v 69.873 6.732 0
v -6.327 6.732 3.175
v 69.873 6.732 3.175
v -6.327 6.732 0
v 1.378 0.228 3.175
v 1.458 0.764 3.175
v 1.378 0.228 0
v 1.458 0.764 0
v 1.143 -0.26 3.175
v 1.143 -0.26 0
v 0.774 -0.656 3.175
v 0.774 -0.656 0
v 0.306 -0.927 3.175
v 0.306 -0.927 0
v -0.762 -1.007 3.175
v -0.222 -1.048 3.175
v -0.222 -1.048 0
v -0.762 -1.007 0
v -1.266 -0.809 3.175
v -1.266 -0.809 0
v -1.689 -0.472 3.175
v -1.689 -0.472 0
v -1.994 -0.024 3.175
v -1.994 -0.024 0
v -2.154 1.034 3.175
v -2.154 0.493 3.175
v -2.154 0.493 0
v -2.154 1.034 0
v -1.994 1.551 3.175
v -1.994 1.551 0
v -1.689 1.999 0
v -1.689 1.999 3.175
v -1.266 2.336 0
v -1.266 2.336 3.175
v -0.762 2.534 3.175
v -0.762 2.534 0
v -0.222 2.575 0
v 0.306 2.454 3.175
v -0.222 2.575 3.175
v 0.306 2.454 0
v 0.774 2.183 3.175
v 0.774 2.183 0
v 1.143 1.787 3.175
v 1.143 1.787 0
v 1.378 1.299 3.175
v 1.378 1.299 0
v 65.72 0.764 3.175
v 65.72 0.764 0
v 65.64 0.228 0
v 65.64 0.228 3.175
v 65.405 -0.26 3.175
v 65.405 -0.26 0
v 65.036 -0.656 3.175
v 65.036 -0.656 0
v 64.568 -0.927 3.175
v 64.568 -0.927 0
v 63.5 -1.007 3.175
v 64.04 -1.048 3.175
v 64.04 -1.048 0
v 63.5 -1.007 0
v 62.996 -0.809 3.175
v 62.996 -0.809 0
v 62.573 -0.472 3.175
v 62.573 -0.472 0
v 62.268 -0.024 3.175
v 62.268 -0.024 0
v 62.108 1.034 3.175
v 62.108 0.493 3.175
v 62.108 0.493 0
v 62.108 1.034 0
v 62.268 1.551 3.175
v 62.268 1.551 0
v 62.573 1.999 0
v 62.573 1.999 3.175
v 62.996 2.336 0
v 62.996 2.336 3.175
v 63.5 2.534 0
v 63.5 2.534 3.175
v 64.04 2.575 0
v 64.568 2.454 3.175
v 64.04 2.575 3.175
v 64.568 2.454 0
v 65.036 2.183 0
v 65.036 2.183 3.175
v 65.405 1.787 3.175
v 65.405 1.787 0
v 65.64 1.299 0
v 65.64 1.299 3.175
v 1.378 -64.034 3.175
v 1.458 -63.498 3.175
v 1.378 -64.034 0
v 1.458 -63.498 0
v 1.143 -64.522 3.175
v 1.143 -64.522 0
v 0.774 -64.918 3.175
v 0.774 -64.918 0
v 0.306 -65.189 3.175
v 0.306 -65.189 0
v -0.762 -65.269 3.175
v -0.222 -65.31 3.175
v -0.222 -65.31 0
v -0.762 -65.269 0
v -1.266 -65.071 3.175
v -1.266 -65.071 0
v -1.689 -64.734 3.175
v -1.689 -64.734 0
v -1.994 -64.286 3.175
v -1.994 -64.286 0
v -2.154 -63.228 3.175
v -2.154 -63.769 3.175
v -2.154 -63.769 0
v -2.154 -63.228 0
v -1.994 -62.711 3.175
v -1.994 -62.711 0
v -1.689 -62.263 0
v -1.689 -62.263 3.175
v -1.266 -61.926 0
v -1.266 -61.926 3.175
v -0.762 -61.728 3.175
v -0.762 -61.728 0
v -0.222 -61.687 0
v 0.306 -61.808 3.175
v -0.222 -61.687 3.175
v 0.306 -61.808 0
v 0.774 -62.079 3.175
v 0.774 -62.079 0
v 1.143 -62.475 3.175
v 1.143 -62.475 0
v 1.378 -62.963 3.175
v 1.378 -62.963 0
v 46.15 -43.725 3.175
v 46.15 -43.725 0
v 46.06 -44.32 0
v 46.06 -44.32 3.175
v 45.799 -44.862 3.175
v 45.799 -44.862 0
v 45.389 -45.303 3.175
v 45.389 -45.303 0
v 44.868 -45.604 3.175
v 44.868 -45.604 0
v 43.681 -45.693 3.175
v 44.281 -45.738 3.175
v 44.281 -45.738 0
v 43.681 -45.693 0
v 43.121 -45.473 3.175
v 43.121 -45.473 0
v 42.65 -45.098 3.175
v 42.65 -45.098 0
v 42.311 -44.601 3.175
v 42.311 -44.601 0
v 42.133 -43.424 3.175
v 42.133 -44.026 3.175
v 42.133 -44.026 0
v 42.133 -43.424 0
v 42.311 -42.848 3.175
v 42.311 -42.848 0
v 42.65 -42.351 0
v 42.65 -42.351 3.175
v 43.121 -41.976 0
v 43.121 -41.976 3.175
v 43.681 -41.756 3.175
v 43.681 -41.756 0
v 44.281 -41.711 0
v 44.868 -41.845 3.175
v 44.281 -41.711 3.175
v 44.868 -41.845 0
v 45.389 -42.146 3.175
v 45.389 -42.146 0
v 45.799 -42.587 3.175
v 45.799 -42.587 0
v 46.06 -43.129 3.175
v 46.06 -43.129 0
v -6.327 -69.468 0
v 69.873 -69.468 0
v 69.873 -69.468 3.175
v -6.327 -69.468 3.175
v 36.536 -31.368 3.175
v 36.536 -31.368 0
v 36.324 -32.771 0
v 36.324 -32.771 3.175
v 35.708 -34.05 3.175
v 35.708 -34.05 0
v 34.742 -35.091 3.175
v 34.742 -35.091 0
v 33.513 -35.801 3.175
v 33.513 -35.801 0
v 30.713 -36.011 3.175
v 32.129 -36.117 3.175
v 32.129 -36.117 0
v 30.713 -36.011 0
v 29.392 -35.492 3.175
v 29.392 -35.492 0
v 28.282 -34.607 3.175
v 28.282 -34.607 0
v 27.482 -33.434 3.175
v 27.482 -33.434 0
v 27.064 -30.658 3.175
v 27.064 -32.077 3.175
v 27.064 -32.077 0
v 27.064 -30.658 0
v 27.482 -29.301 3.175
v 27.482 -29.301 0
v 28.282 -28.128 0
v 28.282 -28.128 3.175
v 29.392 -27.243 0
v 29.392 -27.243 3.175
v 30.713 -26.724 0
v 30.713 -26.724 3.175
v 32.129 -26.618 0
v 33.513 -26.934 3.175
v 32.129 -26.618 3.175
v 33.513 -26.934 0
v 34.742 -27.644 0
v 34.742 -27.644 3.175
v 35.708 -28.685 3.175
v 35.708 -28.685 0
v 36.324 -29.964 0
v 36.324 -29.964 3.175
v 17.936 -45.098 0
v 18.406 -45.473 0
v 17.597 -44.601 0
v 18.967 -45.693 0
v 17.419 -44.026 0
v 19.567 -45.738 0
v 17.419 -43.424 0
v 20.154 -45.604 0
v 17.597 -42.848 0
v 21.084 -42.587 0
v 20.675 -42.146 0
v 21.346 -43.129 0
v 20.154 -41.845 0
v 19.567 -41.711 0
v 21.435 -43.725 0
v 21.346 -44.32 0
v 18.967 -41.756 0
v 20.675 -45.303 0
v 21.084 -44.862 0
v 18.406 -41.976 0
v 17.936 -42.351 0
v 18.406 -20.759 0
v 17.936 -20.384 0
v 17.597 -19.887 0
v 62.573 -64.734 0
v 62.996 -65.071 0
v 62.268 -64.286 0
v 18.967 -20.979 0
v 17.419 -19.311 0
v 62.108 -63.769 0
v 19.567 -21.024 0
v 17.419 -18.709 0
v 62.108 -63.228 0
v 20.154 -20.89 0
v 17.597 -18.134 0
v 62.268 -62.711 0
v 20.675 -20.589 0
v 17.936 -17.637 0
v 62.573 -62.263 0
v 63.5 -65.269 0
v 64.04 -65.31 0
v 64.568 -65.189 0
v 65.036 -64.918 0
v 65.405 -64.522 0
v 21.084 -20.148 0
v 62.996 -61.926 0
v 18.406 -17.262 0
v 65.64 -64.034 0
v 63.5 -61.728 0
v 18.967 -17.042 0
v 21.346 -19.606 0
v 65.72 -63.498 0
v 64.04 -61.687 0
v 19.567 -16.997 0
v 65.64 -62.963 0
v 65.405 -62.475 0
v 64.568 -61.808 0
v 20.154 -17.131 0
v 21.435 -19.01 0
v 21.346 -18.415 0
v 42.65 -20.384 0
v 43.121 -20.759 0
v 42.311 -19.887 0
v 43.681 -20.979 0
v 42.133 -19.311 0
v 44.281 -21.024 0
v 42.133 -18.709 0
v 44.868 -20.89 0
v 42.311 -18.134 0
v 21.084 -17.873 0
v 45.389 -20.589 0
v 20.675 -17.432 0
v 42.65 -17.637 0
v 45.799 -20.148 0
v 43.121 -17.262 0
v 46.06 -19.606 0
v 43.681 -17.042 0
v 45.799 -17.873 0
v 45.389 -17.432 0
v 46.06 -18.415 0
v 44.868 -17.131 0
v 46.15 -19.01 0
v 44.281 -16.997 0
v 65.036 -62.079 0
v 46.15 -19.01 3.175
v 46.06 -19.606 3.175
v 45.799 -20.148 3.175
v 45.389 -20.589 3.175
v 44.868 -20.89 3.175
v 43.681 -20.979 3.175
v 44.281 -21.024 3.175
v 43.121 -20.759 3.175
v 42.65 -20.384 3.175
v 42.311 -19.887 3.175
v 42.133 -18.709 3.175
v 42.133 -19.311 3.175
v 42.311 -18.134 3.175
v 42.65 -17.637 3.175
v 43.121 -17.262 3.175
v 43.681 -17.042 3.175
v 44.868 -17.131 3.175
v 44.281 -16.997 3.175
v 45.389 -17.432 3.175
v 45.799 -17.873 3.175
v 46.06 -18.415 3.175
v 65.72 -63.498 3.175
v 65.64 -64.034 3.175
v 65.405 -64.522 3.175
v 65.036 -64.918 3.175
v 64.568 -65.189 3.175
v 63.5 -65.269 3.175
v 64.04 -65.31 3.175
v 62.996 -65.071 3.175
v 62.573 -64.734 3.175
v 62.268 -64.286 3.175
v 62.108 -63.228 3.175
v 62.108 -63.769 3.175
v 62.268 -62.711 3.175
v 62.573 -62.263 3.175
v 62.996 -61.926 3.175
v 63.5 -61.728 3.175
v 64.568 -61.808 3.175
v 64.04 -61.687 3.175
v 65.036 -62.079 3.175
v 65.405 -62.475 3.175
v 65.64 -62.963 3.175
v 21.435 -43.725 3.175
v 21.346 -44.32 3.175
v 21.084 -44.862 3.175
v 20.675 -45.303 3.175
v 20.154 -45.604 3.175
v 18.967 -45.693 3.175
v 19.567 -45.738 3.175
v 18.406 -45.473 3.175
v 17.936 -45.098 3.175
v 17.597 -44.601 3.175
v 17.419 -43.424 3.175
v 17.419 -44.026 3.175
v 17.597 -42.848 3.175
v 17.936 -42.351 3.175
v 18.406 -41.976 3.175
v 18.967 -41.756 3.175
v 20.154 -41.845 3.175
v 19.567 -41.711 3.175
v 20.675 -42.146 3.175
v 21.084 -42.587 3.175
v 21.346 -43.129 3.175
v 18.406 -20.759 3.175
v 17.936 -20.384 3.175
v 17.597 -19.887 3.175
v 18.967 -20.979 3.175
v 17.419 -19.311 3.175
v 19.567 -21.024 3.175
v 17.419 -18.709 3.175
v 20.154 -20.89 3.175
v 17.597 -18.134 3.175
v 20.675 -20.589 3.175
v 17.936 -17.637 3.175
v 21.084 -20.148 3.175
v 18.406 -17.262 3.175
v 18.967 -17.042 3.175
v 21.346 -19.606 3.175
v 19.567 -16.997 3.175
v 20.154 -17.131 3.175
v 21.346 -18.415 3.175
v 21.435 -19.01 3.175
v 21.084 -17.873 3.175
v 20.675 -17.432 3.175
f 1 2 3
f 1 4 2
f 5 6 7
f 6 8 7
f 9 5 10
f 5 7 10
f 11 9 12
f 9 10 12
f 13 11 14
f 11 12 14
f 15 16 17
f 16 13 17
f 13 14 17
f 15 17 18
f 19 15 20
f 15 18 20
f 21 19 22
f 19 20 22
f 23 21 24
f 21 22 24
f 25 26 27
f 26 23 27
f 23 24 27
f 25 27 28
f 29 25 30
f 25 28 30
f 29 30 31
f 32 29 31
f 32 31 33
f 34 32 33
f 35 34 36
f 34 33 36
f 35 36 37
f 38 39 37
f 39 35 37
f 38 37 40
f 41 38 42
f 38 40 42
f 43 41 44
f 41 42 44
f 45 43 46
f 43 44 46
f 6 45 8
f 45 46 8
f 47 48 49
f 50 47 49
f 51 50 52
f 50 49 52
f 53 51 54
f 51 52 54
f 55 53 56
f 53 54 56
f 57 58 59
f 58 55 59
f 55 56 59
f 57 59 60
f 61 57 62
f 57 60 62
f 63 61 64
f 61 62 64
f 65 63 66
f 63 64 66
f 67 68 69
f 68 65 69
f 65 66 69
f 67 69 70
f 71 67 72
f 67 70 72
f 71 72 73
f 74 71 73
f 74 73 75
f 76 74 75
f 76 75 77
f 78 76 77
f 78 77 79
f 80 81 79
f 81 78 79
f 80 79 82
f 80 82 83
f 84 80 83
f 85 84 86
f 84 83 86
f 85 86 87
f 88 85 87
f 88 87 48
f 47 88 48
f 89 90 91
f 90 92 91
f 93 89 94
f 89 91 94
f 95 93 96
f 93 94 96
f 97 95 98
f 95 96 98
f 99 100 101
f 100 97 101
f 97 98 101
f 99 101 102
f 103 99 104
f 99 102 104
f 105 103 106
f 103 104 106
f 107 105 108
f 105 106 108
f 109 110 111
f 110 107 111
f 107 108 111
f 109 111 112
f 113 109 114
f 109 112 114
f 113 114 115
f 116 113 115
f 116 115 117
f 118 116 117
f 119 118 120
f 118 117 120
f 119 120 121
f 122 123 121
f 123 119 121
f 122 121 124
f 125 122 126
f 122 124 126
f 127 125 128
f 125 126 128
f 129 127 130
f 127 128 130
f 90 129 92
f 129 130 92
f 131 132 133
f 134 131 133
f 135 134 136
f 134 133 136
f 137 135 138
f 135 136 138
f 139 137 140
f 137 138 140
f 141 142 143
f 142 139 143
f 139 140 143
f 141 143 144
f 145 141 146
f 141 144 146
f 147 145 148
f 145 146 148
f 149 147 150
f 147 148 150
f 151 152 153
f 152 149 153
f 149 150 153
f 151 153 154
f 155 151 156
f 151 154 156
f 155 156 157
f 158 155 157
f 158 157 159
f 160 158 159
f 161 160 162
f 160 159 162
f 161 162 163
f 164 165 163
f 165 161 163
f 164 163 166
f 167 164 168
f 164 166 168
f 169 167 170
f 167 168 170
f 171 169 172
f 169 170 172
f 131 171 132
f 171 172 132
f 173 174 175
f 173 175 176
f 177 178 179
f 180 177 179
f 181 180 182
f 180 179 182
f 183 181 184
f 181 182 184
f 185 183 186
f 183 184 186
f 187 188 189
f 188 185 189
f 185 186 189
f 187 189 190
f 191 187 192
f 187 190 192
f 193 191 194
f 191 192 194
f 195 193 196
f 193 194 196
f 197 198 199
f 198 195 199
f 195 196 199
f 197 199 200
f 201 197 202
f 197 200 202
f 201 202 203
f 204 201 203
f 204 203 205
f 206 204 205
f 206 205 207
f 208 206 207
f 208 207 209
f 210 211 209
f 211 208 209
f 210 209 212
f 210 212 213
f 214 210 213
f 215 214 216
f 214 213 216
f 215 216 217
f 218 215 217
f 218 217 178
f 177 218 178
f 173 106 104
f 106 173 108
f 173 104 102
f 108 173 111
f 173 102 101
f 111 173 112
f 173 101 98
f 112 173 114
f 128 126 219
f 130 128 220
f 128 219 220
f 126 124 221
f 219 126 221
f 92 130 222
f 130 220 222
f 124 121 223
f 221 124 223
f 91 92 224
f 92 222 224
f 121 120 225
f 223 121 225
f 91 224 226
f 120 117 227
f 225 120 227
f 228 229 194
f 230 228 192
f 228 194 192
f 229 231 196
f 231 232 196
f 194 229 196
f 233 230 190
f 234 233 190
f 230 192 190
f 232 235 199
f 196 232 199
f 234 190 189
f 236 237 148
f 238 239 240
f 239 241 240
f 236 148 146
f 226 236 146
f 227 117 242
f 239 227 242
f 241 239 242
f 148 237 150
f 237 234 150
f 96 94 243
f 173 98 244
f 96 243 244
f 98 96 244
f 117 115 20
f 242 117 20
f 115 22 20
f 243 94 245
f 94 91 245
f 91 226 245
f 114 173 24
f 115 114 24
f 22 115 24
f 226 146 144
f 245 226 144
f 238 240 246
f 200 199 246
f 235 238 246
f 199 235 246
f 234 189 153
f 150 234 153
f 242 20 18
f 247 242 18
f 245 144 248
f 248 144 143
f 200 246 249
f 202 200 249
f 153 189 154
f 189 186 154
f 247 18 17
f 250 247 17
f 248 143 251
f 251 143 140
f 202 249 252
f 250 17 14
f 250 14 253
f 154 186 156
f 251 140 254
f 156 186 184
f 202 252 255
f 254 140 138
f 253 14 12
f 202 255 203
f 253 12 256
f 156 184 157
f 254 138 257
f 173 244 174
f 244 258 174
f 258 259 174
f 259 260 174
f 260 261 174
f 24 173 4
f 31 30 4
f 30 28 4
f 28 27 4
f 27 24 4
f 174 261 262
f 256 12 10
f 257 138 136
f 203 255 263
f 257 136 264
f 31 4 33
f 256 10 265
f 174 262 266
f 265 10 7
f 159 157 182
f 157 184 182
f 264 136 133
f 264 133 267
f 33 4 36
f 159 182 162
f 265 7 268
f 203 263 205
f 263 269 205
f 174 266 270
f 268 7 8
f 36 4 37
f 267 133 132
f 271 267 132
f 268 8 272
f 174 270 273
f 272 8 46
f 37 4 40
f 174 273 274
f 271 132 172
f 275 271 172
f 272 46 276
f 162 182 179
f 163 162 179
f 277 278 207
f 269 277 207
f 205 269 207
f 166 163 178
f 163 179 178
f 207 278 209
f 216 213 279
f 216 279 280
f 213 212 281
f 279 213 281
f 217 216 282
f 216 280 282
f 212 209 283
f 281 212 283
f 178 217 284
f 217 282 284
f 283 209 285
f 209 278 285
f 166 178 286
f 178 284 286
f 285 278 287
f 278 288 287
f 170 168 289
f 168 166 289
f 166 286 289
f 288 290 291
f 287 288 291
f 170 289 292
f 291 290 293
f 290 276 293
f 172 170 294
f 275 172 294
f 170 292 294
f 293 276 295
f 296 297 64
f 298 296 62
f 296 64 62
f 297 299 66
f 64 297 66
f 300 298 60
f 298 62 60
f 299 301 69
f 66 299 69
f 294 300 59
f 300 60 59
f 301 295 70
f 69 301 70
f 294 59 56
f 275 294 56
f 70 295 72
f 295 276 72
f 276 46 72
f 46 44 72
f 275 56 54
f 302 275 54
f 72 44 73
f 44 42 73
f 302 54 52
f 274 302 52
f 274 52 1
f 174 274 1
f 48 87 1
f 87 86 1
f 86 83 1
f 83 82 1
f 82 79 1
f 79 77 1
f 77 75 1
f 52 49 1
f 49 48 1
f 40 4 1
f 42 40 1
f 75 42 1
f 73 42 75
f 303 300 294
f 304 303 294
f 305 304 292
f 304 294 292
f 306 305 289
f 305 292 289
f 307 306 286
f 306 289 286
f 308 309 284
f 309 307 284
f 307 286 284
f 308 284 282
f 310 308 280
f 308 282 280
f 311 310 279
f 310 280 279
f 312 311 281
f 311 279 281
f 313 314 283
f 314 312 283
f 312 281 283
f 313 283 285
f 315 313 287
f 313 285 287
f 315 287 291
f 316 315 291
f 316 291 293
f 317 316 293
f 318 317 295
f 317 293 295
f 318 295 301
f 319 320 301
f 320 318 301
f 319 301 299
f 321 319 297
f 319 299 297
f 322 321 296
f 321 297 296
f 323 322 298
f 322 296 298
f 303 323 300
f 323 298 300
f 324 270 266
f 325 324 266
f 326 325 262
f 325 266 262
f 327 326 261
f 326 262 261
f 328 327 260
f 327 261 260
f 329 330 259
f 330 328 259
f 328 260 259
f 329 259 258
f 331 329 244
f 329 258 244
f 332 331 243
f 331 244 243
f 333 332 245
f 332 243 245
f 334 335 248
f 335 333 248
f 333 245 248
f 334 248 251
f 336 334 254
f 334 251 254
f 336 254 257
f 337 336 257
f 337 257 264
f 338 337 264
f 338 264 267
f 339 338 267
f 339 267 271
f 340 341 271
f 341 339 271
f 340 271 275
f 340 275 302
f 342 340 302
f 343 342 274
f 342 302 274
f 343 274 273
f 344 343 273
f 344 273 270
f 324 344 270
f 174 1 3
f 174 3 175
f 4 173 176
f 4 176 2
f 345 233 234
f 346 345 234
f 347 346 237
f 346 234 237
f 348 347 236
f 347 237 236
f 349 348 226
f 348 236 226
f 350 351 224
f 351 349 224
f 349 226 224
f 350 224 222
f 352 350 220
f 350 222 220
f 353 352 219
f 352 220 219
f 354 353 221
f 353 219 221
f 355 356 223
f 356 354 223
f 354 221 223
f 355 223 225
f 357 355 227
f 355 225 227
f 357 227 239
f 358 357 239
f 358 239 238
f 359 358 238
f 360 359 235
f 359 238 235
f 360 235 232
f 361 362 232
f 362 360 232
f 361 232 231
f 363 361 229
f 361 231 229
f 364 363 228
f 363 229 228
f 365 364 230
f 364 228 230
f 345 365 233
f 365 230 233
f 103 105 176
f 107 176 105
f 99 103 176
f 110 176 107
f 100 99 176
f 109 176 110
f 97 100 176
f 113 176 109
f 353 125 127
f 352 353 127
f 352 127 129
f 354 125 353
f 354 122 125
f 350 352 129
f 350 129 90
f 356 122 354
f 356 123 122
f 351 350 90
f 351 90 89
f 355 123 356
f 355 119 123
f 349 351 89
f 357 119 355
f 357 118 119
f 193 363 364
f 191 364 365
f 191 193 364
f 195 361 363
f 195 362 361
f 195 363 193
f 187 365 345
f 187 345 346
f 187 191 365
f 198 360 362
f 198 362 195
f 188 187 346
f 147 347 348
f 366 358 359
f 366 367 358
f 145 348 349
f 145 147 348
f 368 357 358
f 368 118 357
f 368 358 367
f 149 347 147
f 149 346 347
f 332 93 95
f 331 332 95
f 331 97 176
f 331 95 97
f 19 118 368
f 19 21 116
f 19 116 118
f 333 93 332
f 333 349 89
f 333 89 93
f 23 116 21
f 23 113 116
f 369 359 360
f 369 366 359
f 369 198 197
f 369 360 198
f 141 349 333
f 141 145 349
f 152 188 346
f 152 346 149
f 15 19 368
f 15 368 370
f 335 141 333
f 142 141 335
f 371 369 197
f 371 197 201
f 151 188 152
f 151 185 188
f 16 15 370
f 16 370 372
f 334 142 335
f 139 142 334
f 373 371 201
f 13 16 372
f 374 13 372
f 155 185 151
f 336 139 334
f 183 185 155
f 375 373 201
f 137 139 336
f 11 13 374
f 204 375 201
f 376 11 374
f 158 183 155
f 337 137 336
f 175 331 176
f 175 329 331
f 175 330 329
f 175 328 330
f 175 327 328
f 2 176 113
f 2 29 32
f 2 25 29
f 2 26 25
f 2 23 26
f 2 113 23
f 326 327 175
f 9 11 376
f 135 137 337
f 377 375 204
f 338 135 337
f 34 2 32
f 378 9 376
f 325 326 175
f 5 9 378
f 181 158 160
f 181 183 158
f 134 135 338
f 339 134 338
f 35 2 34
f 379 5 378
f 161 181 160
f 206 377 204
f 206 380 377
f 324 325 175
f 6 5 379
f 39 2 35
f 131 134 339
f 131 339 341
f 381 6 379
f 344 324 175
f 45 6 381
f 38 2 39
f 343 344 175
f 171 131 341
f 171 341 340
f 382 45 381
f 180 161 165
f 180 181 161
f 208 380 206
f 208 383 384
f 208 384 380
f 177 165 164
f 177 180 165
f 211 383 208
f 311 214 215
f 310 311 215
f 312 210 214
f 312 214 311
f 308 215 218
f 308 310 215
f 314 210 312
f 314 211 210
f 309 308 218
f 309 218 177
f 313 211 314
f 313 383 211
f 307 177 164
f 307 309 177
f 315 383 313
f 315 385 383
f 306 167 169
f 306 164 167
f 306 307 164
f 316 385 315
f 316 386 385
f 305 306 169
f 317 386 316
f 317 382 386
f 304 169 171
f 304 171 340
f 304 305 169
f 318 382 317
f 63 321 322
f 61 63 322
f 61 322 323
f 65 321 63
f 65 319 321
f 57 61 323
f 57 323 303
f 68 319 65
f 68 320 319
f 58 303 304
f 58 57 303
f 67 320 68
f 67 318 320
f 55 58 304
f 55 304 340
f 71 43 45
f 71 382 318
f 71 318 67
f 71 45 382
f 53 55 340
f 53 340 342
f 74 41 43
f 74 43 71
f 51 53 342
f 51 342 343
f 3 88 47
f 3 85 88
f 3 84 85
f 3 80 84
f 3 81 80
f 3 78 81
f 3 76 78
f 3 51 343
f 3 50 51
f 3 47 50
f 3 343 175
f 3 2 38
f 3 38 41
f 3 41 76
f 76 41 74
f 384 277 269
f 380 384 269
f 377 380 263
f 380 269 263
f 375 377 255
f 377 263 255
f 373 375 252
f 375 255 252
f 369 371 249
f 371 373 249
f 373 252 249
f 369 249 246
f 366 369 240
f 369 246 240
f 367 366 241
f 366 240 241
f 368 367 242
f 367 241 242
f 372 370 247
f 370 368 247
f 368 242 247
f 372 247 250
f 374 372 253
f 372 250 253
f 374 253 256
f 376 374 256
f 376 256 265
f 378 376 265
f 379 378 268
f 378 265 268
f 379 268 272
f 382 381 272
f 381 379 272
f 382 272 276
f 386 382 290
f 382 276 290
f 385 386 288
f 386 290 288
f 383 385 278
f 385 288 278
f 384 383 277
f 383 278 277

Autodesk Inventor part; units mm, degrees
ref_plane "YZ Plane" through (0, 0, 0) normal (1, 0, 0) x (0, 1, 0)
ref_plane "XZ Plane" through (0, 0, 0) normal (0, 1, 0) x (-1, 0, 0)
ref_plane "XY Plane" through (0, 0, 0) normal (0, 0, 1) x (1, 0, 0)
sketch "Sketch1" plane through (0, 0, 0) normal (0, 0, 1) x (1, 0, 0)
  line L0 (-6.3269, 6.7325) -> (69.8731, 6.7325)
  line L1 (69.8731, 6.7325) -> (69.8731, -69.4675)
  line L2 (69.8731, -69.4675) -> (-6.3269, -69.4675)
  line L3 (-6.3269, -69.4675) -> (-6.3269, 6.7325)
  line L4 (-6.3269, 6.7325) -> (69.8731, -69.4675) construction
  line L5 (69.8731, 6.7325) -> (-6.3269, -69.4675) construction
  circle A0 centre (31.7731, -31.3675) radius 4.7625
  circle A1 centre (63.9041, 0.7635) radius 1.8161
  circle A2 centre (63.9041, -63.4985) radius 1.8161
  circle A3 centre (-0.3579, -63.4985) radius 1.8161
  circle A4 centre (-0.3579, 0.7635) radius 1.8161
  line L6 (12.7231, -50.4175) -> (50.8231, -50.4175) construction
  line L7 (50.8231, -50.4175) -> (50.8231, -12.3175) construction
  line L8 (50.8231, -12.3175) -> (12.7231, -12.3175) construction
  line L9 (12.7231, -12.3175) -> (12.7231, -50.4175) construction
  line L10 (12.7231, -50.4175) -> (50.8231, -12.3175) construction
  line L11 (50.8231, -50.4175) -> (12.7231, -12.3175) construction
  circle A5 centre (19.416, -19.0104) radius 2.0193
  circle A6 centre (44.1302, -19.0104) radius 2.0193
  circle A7 centre (19.416, -43.7246) radius 2.0193
  circle A8 centre (44.1302, -43.7246) radius 2.0193
  dimension "d0" = 76.2
  dimension "d1" = 76.2
  dimension "d2" = 9.525
  dimension "d4" = 3.6322
  dimension "d5" = 3.6322
  dimension "d6" = 3.6322
  dimension "d7" = 3.6322
  dimension "d11" = 38.1
  dimension "d12" = 38.1
  dimension "d13" = 4.0386
  dimension "d14" = 4.0386
  dimension "d15" = 4.0386
  dimension "d16" = 4.0386
  dimension "d17" = 24.7142
  dimension "d18" = 64.262
extrude "Extrusion1" add sketch "Sketch1" along normal blind 3.175
properties part number "lazy susan5"
